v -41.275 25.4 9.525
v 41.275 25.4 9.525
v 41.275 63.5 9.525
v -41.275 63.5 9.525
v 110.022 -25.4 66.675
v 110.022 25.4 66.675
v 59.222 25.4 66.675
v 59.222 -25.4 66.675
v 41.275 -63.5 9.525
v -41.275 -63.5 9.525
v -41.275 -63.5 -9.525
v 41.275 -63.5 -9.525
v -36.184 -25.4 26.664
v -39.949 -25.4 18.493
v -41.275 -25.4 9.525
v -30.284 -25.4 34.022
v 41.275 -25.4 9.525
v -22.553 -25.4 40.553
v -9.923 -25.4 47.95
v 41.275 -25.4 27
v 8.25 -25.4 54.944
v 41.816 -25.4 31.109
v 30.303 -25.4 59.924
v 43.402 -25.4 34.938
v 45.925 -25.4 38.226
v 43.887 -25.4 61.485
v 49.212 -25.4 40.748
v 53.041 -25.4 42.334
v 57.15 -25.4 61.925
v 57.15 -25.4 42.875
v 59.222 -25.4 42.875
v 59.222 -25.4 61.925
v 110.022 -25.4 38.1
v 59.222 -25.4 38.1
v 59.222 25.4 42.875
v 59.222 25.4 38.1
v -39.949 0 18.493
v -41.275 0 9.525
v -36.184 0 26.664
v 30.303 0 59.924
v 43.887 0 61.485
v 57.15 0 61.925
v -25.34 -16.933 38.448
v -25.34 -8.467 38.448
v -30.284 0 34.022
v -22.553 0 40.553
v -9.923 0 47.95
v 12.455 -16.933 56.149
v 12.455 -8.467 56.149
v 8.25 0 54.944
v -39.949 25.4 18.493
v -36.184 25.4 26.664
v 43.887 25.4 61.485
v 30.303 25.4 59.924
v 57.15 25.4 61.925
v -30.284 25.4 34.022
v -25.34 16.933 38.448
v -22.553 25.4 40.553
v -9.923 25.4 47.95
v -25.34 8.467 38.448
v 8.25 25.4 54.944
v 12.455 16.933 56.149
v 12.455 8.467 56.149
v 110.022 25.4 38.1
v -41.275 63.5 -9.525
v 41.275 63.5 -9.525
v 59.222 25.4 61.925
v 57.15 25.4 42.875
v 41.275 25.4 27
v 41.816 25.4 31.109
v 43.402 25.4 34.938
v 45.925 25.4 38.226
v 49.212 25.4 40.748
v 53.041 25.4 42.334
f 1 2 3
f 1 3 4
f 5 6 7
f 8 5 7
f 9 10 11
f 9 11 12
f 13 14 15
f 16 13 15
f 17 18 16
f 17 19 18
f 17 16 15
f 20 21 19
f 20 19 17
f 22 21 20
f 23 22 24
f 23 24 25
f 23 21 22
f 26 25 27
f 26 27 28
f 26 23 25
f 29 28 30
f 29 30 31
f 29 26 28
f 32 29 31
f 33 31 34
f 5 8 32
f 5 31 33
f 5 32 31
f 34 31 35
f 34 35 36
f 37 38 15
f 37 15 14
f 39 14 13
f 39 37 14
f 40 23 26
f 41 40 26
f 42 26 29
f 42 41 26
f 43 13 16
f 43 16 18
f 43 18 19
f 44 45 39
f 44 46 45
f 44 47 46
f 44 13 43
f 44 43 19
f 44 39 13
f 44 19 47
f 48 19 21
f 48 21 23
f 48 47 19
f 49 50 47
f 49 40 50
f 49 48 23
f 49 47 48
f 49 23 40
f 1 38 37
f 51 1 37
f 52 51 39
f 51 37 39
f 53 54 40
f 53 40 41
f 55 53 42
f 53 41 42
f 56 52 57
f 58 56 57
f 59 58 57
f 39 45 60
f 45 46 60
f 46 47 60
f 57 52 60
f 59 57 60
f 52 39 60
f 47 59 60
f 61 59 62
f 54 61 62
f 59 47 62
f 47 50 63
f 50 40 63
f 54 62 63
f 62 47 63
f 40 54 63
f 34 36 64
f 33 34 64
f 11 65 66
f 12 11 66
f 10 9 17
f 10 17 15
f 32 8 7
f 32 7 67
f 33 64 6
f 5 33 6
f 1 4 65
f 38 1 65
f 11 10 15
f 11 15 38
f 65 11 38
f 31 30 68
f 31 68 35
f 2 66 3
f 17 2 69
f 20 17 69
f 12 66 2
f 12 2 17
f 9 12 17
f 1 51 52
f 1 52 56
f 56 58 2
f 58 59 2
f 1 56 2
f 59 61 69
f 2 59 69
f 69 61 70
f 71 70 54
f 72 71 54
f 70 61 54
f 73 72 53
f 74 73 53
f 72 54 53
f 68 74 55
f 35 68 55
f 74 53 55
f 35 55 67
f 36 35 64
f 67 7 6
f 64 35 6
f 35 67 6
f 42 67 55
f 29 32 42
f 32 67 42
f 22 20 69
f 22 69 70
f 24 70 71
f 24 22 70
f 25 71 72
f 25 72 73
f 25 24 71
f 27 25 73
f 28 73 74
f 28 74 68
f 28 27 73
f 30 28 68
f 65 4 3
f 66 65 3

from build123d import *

# Parameters (mm, degrees)
F1_DEPTH = 63.5
F2_DEPTH = 25.4


with BuildPart() as f1:
    # F0 (on Front) → F1 (new body, symmetric)
    with BuildSketch(Plane.XZ):
        Polygon((-41.275, 9.525), (-41.275, -9.525), (41.275, -9.525), (41.275, 9.525), (22.225, 9.525), align=None)
    extrude(amount=F1_DEPTH, both=True)

    # F0 (on Front) → F2 (join, symmetric)
    with BuildSketch(Plane.XZ):
        Polygon((-41.275, 9.525), (-41.275, -9.525), (41.275, -9.525), (41.275, 9.525), (22.225, 9.525), align=None)
        with BuildLine():
            add(Edge.make_bspline(
                [(-41.275, 9.525), (-41.2570908666, 43.8246317208), (13.9917880297, 62.3455643654), (57.1499800845, 61.9251837055)],
                knots=[0, 0, 0, 0, 111.5045109268, 111.5045109268, 111.5045109268, 111.5045109268], degree=3))
            Line((-41.275, 9.525), (22.225, 9.525))
            Line((22.225, 9.525), (22.225, 27.0001837055))
            ThreePointArc((22.225, 27.0001837055), (32.4542886259, 51.6958809973), (57.1499800845, 61.9251837055))
        make_face()
        with BuildLine():
            Line((22.225, 9.525), (41.275, 9.525))
            Line((41.275, 9.525), (41.275, 27.0001837055))
            ThreePointArc((41.275, 27.0001837055), (45.9246766481, 38.2255006563), (57.1499909475, 42.8751837055))
            Line((57.1499909475, 42.8751837055), (59.2224501729, 42.8751848873))
            Line((59.2224501729, 42.8751848873), (59.2224501729, 61.9251848873))
            Line((59.2224501729, 61.9251848873), (57.1499800845, 61.9251837055))
            ThreePointArc((57.1499800845, 61.9251837055), (32.4542886259, 51.6958809973), (22.225, 27.0001837055))
            Line((22.225, 27.0001837055), (22.225, 9.525))
        make_face()
        Polygon((84.6224501729, 61.9251993713), (59.2224501729, 61.9251848873), (59.2224501729, 42.8751848873), (84.6224501729, 42.8751993713), align=None)
        Polygon((59.2224501729, 66.675), (59.2224501729, 61.9251848873), (84.6224501729, 61.9251993713), (84.6224501729, 66.675), align=None)
        Polygon((84.6224501729, 42.8751993713), (59.2224501729, 42.8751848873), (59.2224501729, 38.1), (84.6224501729, 38.1), align=None)
        Polygon((84.6224501729, 66.675), (84.6224501729, 61.9251993713), (84.6224501729, 42.8751993713), (84.6224501729, 38.1), (110.0224501729, 38.1), (110.0224501729, 66.675), align=None)
    extrude(amount=F2_DEPTH, both=True)


solid = f1.part
